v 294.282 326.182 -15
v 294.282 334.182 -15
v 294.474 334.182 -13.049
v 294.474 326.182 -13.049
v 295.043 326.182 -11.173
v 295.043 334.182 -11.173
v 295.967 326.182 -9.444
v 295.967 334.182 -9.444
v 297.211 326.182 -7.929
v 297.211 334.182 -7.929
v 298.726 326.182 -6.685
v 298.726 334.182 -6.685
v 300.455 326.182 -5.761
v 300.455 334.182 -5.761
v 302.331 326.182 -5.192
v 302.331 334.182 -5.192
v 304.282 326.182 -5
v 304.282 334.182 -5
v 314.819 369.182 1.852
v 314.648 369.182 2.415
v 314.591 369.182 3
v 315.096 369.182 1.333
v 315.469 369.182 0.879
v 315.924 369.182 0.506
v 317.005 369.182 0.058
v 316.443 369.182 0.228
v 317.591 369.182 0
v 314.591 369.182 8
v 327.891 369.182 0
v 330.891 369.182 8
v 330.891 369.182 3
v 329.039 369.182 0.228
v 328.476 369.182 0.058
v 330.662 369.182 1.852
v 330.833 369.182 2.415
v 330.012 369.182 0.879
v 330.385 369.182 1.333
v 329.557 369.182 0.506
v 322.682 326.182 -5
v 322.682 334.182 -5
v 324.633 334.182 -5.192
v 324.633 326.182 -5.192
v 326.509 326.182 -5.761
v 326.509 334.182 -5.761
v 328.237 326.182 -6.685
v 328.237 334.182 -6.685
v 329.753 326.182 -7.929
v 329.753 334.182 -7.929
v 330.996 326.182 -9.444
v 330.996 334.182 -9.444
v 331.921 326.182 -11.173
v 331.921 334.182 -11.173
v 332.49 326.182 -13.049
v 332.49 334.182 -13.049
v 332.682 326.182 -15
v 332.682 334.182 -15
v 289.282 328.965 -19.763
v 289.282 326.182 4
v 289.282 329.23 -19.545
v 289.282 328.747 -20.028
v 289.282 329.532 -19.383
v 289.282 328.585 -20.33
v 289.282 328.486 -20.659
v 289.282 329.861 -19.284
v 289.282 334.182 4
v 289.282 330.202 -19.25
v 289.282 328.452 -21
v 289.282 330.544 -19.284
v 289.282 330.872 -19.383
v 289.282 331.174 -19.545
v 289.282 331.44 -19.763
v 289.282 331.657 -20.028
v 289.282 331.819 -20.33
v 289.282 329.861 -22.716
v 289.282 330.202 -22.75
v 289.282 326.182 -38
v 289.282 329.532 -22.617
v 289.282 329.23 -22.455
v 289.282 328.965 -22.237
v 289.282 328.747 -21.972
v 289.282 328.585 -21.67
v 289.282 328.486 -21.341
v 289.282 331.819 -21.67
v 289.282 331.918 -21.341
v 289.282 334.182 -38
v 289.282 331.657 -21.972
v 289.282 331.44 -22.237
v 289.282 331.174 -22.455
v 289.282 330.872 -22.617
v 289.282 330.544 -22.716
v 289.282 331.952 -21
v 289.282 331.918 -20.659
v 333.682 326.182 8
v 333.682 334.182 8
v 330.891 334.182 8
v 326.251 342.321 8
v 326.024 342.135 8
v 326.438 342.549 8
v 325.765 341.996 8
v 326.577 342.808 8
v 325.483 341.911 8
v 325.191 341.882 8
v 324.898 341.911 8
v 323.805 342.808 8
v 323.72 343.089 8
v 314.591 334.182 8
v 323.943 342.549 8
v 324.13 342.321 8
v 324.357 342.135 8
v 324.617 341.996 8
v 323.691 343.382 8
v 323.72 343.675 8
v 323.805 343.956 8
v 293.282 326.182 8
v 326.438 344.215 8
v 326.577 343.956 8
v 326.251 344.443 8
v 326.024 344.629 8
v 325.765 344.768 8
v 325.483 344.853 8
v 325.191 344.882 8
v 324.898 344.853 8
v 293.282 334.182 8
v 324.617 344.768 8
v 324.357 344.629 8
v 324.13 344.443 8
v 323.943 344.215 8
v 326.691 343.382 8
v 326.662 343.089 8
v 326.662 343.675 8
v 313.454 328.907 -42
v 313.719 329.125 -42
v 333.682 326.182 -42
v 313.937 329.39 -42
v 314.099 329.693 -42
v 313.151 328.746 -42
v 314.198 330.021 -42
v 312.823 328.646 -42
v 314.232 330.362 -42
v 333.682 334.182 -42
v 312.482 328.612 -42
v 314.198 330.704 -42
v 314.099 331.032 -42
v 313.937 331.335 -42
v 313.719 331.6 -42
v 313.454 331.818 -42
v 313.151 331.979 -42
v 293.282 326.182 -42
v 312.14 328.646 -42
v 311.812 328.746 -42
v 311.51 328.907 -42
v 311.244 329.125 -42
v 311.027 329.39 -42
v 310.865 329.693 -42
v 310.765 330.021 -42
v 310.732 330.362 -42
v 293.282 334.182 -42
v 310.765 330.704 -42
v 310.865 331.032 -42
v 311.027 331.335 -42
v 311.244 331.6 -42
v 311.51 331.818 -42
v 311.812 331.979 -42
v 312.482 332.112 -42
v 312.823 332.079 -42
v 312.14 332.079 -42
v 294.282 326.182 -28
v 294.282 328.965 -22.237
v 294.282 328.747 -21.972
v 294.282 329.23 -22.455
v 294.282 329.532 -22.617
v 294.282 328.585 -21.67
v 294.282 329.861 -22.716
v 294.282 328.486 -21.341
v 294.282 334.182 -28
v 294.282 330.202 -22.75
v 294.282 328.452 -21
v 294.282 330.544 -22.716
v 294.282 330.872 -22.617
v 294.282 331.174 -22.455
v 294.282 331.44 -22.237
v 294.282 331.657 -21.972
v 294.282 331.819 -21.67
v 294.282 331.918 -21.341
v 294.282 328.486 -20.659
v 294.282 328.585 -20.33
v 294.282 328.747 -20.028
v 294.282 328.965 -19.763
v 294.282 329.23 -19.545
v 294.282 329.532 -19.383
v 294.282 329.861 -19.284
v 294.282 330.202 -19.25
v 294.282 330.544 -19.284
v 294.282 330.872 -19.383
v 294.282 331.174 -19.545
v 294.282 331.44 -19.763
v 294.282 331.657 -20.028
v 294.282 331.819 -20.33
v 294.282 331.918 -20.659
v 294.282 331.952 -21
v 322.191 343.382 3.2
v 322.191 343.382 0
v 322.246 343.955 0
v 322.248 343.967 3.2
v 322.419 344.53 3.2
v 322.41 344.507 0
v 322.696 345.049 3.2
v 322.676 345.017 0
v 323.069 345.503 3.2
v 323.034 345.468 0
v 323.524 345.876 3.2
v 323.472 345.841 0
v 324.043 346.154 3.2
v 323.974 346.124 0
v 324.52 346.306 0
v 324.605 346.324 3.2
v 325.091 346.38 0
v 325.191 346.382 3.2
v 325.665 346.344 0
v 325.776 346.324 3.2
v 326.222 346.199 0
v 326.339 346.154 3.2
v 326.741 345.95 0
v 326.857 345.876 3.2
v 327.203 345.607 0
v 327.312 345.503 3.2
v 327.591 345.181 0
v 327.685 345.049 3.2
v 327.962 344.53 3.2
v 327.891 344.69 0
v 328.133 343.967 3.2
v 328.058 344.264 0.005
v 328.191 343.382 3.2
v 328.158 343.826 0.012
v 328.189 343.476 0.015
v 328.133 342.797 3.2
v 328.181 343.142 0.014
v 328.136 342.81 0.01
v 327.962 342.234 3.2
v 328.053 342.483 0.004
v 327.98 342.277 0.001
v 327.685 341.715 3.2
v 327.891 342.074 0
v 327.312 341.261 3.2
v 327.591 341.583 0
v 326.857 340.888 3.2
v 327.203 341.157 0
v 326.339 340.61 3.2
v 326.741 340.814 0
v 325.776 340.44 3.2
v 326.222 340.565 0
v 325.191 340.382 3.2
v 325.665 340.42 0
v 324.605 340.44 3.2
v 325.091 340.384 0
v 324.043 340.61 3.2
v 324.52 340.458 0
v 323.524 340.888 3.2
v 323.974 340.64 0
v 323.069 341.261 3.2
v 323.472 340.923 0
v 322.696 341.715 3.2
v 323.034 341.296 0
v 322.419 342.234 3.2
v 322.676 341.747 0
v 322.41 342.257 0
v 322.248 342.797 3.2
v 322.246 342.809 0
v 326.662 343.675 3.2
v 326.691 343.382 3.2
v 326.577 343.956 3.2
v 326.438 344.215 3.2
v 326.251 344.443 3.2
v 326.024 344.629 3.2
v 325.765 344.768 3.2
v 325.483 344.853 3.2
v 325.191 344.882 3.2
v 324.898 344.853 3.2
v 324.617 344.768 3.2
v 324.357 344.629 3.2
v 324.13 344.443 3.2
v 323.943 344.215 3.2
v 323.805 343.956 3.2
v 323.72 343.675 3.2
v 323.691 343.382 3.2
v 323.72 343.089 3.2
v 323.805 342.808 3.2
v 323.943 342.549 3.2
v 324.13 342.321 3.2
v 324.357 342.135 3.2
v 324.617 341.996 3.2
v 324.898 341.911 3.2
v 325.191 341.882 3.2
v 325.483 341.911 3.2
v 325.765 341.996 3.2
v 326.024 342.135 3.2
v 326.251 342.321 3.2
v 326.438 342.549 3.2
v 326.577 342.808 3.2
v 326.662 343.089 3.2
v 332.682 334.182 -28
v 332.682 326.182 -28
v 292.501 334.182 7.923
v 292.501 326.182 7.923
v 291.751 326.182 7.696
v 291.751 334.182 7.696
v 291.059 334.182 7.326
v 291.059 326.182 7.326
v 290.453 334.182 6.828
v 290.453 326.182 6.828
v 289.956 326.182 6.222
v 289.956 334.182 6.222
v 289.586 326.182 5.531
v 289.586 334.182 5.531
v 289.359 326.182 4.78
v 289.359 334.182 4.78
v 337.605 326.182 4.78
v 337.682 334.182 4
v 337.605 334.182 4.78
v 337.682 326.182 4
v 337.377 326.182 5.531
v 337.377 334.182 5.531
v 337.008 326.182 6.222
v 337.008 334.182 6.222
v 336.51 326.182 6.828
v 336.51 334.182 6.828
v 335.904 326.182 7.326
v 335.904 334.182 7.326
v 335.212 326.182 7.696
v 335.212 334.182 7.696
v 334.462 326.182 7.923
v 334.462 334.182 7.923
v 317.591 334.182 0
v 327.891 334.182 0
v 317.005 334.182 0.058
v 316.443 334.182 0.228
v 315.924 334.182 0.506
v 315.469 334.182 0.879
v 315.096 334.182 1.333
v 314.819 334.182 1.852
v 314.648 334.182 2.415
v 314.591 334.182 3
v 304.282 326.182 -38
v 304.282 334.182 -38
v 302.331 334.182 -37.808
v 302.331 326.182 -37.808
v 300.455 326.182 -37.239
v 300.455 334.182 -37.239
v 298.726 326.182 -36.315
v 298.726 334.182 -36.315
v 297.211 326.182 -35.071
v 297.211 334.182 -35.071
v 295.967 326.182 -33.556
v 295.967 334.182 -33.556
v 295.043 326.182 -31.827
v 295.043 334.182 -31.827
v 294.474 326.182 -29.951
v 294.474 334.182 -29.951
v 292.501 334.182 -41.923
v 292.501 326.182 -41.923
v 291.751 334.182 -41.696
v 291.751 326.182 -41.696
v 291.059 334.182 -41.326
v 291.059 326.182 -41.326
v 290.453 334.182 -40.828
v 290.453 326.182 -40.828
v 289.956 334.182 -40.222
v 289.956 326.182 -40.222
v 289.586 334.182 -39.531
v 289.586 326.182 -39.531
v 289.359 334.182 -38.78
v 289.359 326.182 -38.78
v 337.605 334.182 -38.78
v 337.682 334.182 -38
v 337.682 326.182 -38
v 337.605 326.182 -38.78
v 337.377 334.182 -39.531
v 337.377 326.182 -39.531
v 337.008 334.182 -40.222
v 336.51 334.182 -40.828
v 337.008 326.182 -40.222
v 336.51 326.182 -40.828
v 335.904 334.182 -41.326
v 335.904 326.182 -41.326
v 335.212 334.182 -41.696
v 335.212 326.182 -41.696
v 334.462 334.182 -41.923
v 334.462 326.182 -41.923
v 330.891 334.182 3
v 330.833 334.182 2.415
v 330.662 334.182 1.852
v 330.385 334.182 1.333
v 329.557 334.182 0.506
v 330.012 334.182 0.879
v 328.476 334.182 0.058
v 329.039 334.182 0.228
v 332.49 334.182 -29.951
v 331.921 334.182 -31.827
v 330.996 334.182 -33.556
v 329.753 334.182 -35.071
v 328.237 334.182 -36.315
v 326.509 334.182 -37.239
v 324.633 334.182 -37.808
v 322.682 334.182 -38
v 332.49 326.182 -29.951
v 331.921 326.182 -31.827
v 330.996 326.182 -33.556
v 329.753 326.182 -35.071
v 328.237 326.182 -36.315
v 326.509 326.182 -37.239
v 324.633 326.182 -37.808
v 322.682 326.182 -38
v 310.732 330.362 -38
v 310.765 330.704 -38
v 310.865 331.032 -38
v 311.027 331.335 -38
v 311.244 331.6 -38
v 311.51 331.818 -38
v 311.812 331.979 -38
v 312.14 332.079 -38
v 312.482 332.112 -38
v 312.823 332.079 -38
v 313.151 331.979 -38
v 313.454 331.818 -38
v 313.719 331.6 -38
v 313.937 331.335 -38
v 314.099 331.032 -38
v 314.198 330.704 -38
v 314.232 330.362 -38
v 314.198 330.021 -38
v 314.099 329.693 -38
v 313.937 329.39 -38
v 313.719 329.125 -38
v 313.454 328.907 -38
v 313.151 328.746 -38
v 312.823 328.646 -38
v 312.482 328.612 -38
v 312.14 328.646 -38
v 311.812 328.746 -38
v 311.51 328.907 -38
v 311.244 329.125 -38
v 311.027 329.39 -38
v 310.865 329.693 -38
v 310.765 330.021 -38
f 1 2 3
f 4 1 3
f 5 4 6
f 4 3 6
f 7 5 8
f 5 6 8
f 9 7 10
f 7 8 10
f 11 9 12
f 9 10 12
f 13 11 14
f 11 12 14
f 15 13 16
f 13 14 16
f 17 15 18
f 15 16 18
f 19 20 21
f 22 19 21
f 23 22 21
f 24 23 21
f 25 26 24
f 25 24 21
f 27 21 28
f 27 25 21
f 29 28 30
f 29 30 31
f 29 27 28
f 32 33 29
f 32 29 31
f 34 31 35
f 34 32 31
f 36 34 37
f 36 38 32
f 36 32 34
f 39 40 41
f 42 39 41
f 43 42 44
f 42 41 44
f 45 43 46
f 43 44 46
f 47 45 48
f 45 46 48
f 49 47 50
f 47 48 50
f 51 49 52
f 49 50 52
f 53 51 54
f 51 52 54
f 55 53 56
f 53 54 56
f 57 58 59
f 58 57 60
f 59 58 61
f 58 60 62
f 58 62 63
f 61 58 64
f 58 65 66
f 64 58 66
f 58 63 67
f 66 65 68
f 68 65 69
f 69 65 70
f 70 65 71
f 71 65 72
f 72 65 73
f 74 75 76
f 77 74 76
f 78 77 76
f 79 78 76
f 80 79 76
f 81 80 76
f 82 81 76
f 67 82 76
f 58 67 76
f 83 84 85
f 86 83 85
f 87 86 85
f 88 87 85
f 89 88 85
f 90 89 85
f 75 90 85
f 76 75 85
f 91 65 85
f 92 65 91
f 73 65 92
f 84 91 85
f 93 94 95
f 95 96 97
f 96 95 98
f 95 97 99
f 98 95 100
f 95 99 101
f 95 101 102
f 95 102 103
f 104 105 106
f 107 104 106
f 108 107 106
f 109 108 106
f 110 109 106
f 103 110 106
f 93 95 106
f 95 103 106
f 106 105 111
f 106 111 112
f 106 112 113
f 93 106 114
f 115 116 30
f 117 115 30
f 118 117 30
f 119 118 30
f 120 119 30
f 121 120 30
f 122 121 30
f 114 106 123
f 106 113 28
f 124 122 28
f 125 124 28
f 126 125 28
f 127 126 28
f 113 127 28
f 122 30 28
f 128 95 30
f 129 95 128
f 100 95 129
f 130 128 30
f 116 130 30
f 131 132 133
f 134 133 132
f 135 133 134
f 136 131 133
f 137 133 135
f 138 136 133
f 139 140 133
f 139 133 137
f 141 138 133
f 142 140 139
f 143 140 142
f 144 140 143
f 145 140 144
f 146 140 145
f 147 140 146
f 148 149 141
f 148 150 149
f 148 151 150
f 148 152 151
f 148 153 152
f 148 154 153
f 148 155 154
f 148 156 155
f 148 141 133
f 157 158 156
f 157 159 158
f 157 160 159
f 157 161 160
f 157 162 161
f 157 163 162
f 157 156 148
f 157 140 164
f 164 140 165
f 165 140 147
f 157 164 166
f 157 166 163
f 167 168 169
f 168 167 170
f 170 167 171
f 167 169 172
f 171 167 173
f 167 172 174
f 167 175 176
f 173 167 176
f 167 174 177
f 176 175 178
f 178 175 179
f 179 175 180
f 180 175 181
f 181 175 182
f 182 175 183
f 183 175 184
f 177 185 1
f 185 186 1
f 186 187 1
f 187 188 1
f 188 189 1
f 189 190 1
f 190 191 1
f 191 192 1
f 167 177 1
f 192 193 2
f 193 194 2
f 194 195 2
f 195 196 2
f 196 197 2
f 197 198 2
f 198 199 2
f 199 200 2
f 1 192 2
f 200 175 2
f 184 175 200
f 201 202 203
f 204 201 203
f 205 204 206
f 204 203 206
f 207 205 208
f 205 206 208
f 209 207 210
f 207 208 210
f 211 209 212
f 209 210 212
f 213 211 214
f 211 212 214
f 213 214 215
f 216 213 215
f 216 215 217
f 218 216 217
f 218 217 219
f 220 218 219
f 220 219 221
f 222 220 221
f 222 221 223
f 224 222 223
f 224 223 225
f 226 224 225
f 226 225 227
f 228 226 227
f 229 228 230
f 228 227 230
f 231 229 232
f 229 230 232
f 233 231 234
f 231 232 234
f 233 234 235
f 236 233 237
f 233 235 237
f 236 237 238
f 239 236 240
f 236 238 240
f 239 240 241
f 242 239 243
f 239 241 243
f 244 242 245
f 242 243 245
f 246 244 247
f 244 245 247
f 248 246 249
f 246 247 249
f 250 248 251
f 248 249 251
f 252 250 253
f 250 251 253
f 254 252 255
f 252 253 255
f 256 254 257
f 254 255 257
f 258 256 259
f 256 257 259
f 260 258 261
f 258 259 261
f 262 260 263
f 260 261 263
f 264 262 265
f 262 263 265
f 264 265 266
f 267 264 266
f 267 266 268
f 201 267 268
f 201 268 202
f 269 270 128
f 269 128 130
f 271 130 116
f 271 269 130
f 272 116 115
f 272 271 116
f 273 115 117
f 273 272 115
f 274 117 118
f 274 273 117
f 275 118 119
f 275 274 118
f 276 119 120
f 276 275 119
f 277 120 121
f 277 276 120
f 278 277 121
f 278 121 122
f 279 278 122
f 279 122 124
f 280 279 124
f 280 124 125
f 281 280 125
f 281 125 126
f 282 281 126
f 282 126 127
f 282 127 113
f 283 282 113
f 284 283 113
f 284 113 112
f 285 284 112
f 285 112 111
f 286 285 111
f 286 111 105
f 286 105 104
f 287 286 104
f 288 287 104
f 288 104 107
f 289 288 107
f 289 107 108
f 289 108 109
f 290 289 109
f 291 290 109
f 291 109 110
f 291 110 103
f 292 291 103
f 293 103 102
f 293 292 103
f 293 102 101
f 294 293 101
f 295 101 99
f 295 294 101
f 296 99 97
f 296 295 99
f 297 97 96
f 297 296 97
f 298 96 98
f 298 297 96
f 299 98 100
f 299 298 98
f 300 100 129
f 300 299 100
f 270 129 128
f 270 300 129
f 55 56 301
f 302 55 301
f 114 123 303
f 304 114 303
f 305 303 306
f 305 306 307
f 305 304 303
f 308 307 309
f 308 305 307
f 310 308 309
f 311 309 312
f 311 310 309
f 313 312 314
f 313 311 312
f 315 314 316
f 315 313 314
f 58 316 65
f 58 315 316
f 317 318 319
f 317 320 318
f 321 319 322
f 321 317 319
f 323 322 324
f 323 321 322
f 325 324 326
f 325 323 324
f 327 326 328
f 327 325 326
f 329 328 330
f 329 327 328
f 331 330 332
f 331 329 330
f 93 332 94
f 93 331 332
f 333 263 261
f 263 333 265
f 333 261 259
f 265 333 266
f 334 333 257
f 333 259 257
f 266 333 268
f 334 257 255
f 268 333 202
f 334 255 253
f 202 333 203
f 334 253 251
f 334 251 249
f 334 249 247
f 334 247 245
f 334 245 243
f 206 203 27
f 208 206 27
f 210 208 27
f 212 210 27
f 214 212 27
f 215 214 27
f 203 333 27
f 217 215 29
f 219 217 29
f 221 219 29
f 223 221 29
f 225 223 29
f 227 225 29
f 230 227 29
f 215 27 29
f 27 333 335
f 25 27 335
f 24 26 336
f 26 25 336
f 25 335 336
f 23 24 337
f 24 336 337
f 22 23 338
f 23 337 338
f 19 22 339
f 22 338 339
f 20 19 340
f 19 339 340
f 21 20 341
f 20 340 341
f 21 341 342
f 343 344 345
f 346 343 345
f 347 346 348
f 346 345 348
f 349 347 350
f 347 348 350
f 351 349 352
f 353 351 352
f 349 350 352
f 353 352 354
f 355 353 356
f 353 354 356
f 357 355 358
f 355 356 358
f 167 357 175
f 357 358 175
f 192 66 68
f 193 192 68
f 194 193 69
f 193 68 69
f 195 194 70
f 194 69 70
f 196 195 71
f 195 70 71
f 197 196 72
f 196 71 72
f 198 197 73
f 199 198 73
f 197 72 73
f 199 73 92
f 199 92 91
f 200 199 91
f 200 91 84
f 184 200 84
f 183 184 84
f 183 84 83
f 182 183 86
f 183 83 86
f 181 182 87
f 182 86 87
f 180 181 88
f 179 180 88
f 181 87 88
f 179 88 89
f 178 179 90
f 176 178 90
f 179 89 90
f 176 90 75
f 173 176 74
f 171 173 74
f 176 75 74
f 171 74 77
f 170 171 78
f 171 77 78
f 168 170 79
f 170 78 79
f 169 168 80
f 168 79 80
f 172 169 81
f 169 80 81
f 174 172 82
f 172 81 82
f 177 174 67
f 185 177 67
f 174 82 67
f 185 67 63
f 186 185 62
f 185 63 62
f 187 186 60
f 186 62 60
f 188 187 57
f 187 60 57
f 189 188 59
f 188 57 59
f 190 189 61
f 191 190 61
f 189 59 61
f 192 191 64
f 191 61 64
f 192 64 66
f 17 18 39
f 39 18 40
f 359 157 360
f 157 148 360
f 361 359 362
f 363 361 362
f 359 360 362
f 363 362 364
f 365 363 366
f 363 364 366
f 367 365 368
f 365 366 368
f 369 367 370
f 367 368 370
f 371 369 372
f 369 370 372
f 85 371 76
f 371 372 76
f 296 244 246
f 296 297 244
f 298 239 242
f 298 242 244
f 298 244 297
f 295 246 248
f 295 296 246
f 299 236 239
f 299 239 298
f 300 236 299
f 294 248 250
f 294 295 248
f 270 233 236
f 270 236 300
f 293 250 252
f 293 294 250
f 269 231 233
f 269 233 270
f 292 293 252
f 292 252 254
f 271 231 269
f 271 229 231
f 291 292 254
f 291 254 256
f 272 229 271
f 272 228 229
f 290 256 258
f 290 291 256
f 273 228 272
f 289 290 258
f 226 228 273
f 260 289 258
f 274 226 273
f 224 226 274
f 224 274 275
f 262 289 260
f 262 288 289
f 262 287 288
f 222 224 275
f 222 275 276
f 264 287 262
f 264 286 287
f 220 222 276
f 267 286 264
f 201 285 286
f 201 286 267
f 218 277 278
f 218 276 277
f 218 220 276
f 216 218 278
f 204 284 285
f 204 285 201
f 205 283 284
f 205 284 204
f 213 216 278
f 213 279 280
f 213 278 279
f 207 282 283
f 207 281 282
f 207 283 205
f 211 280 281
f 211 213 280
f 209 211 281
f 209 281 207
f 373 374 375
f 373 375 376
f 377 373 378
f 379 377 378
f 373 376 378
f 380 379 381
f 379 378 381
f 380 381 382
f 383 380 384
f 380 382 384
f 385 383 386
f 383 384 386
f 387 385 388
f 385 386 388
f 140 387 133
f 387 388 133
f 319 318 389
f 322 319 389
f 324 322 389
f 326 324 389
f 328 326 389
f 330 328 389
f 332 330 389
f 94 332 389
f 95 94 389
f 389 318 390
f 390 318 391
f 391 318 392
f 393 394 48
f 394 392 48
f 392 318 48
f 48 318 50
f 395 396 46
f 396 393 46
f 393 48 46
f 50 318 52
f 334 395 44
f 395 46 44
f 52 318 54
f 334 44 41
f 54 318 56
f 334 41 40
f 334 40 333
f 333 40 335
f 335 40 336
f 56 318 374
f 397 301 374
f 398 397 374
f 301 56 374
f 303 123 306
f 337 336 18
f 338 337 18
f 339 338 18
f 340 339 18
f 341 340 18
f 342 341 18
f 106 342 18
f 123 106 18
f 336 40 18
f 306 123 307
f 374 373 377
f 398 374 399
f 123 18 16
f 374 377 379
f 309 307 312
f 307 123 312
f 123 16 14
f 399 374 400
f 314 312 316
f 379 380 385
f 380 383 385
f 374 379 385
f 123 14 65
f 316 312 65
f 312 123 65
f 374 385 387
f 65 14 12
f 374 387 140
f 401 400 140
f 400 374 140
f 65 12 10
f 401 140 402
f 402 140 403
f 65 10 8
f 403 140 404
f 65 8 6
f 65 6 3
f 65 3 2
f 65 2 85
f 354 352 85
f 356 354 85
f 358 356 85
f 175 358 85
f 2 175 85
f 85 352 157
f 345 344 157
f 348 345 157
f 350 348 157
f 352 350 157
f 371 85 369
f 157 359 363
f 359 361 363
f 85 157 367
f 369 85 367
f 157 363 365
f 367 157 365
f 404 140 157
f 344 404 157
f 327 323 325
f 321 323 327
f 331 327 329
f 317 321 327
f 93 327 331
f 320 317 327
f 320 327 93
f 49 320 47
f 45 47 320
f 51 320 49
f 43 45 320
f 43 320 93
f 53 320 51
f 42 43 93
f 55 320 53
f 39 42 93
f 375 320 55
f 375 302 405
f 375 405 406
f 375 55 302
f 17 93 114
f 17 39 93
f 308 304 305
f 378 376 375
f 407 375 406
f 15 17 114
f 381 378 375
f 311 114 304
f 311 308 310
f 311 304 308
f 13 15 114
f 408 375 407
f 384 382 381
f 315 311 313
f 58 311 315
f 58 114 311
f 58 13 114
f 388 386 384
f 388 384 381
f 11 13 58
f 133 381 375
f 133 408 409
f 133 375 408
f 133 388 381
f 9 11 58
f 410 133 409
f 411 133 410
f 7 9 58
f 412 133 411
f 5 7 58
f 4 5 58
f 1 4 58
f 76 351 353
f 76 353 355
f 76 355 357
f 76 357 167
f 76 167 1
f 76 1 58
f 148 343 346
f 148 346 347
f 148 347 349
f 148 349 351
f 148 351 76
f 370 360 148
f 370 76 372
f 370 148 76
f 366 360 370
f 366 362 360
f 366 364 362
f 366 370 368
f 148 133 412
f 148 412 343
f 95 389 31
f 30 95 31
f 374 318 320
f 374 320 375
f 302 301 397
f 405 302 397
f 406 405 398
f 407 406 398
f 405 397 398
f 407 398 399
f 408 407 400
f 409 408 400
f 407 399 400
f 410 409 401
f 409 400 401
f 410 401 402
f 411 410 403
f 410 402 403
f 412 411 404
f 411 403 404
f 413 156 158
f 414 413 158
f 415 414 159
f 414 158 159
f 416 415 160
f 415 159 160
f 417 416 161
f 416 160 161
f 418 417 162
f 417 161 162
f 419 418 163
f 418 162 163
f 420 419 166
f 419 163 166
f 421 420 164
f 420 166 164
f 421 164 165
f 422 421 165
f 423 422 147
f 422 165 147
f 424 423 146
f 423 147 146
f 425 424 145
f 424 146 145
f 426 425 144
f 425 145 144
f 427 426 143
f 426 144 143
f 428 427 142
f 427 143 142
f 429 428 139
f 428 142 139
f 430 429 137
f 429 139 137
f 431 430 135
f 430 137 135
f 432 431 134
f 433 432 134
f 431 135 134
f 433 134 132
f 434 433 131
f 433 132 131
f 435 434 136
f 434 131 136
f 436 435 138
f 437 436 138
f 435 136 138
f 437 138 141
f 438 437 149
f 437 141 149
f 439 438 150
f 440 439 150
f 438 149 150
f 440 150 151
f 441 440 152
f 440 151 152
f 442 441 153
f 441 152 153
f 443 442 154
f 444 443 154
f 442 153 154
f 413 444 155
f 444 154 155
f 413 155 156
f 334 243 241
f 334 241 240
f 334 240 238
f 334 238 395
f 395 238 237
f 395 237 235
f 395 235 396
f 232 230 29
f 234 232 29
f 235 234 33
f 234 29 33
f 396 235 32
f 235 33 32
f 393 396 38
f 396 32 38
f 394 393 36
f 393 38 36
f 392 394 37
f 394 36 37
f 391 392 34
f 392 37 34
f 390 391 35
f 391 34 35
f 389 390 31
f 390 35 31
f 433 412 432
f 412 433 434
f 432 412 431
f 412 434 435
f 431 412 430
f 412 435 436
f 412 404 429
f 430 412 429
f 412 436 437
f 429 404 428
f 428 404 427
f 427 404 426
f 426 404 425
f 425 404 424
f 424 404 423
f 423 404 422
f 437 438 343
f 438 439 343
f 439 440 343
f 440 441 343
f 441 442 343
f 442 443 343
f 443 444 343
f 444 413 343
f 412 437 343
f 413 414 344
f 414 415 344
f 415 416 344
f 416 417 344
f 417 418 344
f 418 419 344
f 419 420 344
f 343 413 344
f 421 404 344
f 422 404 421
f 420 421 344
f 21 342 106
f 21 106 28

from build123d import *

# Parameters (mm, degrees)
SKETCH1_W           = 16.3
SKETCH1_H           = 35
SKETCH1_R           = 1.5
BOSS_EXTRUDE1_DEPTH = 8
SKETCH2_W           = 48.4
SKETCH2_H           = 50
BOSS_EXTRUDE2_DEPTH = 8
SKETCH3_R           = 1.75
CUT_EXTRUDE1_DEPTH  = 4
SKETCH4_R           = 1.75
CUT_EXTRUDE2_DEPTH  = 5
SKETCH5_R           = 3
CUT_EXTRUDE3_DEPTH  = 3.2
FILLET1_R           = 4
FILLET2_R           = 3


with BuildPart() as part:
    # Sketch1 → Boss-Extrude1 (new body)
    with BuildSketch(Plane.XY):
        with Locations((322.740686013, 351.682010011)):
            Rectangle(SKETCH1_W, SKETCH1_H)
        with Locations((325.190686013, 343.382010011)):
            Circle(SKETCH1_R, mode=Mode.SUBTRACT)
    extrude(amount=BOSS_EXTRUDE1_DEPTH)

    # Sketch2 → Boss-Extrude2 (add)
    with BuildSketch(Plane(origin=(0, 334.182010011, 0), x_dir=(-1, 0, 0), z_dir=(0, -1, 0))):
        with Locations((-313.481750966, 17)):
            Rectangle(SKETCH2_W, SKETCH2_H)
        with BuildLine():
            Line((-322.681750966, 38), (-304.281750966, 38))
            ThreePointArc((-304.281750966, 38), (-297.210683154, 35.071067812), (-294.281750966, 28))
            Line((-294.281750966, 28), (-294.281750966, 15))
            ThreePointArc((-294.281750966, 15), (-297.210683154, 7.928932188), (-304.281750966, 5))
            Line((-304.281750966, 5), (-322.681750966, 5))
            ThreePointArc((-322.681750966, 5), (-329.752818778, 7.928932188), (-332.681750966, 15))
            Line((-332.681750966, 15), (-332.681750966, 28))
            ThreePointArc((-332.681750966, 28), (-329.752818778, 35.071067812), (-322.681750966, 38))
        make_face(mode=Mode.SUBTRACT)
    extrude(amount=BOSS_EXTRUDE2_DEPTH)

    # Sketch3 → Cut-Extrude1 (cut)
    with BuildSketch(Plane(origin=(0, 0, -42), x_dir=(-1, 0, 0), z_dir=(0, 0, -1))):
        with Locations((-312.481750966, 330.362434358)):
            Circle(SKETCH3_R)
    extrude(amount=-CUT_EXTRUDE1_DEPTH, mode=Mode.SUBTRACT)

    # Sketch4 → Cut-Extrude2 (cut)
    with BuildSketch(Plane.ZY.offset(-289.281750966)):
        with Locations((-21, 330.202094394)):
            Circle(SKETCH4_R)
    extrude(amount=-CUT_EXTRUDE2_DEPTH, mode=Mode.SUBTRACT)

    # Sketch5 → Cut-Extrude3 (cut)
    with BuildSketch(Plane(origin=(0, 0, 0), x_dir=(-1, 0, 0), z_dir=(0, 0, -1))):
        with Locations((-325.190686013, 343.382010011)):
            Circle(SKETCH5_R)
    extrude(amount=-CUT_EXTRUDE3_DEPTH, mode=Mode.SUBTRACT)

    # Fillet1
    fillet1_edges = [part.edges().sort_by_distance(p)[0] for p in [
        (337.681750966, 330.182010011, -42),
        (337.681750966, 330.182010011, 8),
        (289.281750966, 330.182010011, 8),
        (289.281750966, 330.182010011, -42),
    ]]
    fillet(fillet1_edges, radius=FILLET1_R)

    # Fillet2
    # the kernel refuses this fillet: 3 mm, written as the material it takes off along each edge
    with BuildSketch(Plane(origin=(330.890686013, 376.682010011, 0), x_dir=(-1, 0, 0), z_dir=(0, -1, 0))) as fillet2_piece_1:
        with BuildLine():
            CenterArc((FILLET2_R, -FILLET2_R), FILLET2_R, 90, 90)
            Line((0, -FILLET2_R), (0, 0))
            Line((0, 0), (FILLET2_R, 0))
        make_face()
    extrude(amount=42.5, mode=Mode.SUBTRACT)
    with BuildSketch(Plane(origin=(314.590686013, 334.182010011, 0), x_dir=(0, 0, 1), z_dir=(0, 1, 0))) as fillet2_piece_2:
        with BuildLine():
            CenterArc((FILLET2_R, FILLET2_R), FILLET2_R, 180, 90)
            Line((0, FILLET2_R), (0, 0))
            Line((0, 0), (FILLET2_R, 0))
        make_face()
    extrude(amount=42.5, mode=Mode.SUBTRACT)


solid = part.part
